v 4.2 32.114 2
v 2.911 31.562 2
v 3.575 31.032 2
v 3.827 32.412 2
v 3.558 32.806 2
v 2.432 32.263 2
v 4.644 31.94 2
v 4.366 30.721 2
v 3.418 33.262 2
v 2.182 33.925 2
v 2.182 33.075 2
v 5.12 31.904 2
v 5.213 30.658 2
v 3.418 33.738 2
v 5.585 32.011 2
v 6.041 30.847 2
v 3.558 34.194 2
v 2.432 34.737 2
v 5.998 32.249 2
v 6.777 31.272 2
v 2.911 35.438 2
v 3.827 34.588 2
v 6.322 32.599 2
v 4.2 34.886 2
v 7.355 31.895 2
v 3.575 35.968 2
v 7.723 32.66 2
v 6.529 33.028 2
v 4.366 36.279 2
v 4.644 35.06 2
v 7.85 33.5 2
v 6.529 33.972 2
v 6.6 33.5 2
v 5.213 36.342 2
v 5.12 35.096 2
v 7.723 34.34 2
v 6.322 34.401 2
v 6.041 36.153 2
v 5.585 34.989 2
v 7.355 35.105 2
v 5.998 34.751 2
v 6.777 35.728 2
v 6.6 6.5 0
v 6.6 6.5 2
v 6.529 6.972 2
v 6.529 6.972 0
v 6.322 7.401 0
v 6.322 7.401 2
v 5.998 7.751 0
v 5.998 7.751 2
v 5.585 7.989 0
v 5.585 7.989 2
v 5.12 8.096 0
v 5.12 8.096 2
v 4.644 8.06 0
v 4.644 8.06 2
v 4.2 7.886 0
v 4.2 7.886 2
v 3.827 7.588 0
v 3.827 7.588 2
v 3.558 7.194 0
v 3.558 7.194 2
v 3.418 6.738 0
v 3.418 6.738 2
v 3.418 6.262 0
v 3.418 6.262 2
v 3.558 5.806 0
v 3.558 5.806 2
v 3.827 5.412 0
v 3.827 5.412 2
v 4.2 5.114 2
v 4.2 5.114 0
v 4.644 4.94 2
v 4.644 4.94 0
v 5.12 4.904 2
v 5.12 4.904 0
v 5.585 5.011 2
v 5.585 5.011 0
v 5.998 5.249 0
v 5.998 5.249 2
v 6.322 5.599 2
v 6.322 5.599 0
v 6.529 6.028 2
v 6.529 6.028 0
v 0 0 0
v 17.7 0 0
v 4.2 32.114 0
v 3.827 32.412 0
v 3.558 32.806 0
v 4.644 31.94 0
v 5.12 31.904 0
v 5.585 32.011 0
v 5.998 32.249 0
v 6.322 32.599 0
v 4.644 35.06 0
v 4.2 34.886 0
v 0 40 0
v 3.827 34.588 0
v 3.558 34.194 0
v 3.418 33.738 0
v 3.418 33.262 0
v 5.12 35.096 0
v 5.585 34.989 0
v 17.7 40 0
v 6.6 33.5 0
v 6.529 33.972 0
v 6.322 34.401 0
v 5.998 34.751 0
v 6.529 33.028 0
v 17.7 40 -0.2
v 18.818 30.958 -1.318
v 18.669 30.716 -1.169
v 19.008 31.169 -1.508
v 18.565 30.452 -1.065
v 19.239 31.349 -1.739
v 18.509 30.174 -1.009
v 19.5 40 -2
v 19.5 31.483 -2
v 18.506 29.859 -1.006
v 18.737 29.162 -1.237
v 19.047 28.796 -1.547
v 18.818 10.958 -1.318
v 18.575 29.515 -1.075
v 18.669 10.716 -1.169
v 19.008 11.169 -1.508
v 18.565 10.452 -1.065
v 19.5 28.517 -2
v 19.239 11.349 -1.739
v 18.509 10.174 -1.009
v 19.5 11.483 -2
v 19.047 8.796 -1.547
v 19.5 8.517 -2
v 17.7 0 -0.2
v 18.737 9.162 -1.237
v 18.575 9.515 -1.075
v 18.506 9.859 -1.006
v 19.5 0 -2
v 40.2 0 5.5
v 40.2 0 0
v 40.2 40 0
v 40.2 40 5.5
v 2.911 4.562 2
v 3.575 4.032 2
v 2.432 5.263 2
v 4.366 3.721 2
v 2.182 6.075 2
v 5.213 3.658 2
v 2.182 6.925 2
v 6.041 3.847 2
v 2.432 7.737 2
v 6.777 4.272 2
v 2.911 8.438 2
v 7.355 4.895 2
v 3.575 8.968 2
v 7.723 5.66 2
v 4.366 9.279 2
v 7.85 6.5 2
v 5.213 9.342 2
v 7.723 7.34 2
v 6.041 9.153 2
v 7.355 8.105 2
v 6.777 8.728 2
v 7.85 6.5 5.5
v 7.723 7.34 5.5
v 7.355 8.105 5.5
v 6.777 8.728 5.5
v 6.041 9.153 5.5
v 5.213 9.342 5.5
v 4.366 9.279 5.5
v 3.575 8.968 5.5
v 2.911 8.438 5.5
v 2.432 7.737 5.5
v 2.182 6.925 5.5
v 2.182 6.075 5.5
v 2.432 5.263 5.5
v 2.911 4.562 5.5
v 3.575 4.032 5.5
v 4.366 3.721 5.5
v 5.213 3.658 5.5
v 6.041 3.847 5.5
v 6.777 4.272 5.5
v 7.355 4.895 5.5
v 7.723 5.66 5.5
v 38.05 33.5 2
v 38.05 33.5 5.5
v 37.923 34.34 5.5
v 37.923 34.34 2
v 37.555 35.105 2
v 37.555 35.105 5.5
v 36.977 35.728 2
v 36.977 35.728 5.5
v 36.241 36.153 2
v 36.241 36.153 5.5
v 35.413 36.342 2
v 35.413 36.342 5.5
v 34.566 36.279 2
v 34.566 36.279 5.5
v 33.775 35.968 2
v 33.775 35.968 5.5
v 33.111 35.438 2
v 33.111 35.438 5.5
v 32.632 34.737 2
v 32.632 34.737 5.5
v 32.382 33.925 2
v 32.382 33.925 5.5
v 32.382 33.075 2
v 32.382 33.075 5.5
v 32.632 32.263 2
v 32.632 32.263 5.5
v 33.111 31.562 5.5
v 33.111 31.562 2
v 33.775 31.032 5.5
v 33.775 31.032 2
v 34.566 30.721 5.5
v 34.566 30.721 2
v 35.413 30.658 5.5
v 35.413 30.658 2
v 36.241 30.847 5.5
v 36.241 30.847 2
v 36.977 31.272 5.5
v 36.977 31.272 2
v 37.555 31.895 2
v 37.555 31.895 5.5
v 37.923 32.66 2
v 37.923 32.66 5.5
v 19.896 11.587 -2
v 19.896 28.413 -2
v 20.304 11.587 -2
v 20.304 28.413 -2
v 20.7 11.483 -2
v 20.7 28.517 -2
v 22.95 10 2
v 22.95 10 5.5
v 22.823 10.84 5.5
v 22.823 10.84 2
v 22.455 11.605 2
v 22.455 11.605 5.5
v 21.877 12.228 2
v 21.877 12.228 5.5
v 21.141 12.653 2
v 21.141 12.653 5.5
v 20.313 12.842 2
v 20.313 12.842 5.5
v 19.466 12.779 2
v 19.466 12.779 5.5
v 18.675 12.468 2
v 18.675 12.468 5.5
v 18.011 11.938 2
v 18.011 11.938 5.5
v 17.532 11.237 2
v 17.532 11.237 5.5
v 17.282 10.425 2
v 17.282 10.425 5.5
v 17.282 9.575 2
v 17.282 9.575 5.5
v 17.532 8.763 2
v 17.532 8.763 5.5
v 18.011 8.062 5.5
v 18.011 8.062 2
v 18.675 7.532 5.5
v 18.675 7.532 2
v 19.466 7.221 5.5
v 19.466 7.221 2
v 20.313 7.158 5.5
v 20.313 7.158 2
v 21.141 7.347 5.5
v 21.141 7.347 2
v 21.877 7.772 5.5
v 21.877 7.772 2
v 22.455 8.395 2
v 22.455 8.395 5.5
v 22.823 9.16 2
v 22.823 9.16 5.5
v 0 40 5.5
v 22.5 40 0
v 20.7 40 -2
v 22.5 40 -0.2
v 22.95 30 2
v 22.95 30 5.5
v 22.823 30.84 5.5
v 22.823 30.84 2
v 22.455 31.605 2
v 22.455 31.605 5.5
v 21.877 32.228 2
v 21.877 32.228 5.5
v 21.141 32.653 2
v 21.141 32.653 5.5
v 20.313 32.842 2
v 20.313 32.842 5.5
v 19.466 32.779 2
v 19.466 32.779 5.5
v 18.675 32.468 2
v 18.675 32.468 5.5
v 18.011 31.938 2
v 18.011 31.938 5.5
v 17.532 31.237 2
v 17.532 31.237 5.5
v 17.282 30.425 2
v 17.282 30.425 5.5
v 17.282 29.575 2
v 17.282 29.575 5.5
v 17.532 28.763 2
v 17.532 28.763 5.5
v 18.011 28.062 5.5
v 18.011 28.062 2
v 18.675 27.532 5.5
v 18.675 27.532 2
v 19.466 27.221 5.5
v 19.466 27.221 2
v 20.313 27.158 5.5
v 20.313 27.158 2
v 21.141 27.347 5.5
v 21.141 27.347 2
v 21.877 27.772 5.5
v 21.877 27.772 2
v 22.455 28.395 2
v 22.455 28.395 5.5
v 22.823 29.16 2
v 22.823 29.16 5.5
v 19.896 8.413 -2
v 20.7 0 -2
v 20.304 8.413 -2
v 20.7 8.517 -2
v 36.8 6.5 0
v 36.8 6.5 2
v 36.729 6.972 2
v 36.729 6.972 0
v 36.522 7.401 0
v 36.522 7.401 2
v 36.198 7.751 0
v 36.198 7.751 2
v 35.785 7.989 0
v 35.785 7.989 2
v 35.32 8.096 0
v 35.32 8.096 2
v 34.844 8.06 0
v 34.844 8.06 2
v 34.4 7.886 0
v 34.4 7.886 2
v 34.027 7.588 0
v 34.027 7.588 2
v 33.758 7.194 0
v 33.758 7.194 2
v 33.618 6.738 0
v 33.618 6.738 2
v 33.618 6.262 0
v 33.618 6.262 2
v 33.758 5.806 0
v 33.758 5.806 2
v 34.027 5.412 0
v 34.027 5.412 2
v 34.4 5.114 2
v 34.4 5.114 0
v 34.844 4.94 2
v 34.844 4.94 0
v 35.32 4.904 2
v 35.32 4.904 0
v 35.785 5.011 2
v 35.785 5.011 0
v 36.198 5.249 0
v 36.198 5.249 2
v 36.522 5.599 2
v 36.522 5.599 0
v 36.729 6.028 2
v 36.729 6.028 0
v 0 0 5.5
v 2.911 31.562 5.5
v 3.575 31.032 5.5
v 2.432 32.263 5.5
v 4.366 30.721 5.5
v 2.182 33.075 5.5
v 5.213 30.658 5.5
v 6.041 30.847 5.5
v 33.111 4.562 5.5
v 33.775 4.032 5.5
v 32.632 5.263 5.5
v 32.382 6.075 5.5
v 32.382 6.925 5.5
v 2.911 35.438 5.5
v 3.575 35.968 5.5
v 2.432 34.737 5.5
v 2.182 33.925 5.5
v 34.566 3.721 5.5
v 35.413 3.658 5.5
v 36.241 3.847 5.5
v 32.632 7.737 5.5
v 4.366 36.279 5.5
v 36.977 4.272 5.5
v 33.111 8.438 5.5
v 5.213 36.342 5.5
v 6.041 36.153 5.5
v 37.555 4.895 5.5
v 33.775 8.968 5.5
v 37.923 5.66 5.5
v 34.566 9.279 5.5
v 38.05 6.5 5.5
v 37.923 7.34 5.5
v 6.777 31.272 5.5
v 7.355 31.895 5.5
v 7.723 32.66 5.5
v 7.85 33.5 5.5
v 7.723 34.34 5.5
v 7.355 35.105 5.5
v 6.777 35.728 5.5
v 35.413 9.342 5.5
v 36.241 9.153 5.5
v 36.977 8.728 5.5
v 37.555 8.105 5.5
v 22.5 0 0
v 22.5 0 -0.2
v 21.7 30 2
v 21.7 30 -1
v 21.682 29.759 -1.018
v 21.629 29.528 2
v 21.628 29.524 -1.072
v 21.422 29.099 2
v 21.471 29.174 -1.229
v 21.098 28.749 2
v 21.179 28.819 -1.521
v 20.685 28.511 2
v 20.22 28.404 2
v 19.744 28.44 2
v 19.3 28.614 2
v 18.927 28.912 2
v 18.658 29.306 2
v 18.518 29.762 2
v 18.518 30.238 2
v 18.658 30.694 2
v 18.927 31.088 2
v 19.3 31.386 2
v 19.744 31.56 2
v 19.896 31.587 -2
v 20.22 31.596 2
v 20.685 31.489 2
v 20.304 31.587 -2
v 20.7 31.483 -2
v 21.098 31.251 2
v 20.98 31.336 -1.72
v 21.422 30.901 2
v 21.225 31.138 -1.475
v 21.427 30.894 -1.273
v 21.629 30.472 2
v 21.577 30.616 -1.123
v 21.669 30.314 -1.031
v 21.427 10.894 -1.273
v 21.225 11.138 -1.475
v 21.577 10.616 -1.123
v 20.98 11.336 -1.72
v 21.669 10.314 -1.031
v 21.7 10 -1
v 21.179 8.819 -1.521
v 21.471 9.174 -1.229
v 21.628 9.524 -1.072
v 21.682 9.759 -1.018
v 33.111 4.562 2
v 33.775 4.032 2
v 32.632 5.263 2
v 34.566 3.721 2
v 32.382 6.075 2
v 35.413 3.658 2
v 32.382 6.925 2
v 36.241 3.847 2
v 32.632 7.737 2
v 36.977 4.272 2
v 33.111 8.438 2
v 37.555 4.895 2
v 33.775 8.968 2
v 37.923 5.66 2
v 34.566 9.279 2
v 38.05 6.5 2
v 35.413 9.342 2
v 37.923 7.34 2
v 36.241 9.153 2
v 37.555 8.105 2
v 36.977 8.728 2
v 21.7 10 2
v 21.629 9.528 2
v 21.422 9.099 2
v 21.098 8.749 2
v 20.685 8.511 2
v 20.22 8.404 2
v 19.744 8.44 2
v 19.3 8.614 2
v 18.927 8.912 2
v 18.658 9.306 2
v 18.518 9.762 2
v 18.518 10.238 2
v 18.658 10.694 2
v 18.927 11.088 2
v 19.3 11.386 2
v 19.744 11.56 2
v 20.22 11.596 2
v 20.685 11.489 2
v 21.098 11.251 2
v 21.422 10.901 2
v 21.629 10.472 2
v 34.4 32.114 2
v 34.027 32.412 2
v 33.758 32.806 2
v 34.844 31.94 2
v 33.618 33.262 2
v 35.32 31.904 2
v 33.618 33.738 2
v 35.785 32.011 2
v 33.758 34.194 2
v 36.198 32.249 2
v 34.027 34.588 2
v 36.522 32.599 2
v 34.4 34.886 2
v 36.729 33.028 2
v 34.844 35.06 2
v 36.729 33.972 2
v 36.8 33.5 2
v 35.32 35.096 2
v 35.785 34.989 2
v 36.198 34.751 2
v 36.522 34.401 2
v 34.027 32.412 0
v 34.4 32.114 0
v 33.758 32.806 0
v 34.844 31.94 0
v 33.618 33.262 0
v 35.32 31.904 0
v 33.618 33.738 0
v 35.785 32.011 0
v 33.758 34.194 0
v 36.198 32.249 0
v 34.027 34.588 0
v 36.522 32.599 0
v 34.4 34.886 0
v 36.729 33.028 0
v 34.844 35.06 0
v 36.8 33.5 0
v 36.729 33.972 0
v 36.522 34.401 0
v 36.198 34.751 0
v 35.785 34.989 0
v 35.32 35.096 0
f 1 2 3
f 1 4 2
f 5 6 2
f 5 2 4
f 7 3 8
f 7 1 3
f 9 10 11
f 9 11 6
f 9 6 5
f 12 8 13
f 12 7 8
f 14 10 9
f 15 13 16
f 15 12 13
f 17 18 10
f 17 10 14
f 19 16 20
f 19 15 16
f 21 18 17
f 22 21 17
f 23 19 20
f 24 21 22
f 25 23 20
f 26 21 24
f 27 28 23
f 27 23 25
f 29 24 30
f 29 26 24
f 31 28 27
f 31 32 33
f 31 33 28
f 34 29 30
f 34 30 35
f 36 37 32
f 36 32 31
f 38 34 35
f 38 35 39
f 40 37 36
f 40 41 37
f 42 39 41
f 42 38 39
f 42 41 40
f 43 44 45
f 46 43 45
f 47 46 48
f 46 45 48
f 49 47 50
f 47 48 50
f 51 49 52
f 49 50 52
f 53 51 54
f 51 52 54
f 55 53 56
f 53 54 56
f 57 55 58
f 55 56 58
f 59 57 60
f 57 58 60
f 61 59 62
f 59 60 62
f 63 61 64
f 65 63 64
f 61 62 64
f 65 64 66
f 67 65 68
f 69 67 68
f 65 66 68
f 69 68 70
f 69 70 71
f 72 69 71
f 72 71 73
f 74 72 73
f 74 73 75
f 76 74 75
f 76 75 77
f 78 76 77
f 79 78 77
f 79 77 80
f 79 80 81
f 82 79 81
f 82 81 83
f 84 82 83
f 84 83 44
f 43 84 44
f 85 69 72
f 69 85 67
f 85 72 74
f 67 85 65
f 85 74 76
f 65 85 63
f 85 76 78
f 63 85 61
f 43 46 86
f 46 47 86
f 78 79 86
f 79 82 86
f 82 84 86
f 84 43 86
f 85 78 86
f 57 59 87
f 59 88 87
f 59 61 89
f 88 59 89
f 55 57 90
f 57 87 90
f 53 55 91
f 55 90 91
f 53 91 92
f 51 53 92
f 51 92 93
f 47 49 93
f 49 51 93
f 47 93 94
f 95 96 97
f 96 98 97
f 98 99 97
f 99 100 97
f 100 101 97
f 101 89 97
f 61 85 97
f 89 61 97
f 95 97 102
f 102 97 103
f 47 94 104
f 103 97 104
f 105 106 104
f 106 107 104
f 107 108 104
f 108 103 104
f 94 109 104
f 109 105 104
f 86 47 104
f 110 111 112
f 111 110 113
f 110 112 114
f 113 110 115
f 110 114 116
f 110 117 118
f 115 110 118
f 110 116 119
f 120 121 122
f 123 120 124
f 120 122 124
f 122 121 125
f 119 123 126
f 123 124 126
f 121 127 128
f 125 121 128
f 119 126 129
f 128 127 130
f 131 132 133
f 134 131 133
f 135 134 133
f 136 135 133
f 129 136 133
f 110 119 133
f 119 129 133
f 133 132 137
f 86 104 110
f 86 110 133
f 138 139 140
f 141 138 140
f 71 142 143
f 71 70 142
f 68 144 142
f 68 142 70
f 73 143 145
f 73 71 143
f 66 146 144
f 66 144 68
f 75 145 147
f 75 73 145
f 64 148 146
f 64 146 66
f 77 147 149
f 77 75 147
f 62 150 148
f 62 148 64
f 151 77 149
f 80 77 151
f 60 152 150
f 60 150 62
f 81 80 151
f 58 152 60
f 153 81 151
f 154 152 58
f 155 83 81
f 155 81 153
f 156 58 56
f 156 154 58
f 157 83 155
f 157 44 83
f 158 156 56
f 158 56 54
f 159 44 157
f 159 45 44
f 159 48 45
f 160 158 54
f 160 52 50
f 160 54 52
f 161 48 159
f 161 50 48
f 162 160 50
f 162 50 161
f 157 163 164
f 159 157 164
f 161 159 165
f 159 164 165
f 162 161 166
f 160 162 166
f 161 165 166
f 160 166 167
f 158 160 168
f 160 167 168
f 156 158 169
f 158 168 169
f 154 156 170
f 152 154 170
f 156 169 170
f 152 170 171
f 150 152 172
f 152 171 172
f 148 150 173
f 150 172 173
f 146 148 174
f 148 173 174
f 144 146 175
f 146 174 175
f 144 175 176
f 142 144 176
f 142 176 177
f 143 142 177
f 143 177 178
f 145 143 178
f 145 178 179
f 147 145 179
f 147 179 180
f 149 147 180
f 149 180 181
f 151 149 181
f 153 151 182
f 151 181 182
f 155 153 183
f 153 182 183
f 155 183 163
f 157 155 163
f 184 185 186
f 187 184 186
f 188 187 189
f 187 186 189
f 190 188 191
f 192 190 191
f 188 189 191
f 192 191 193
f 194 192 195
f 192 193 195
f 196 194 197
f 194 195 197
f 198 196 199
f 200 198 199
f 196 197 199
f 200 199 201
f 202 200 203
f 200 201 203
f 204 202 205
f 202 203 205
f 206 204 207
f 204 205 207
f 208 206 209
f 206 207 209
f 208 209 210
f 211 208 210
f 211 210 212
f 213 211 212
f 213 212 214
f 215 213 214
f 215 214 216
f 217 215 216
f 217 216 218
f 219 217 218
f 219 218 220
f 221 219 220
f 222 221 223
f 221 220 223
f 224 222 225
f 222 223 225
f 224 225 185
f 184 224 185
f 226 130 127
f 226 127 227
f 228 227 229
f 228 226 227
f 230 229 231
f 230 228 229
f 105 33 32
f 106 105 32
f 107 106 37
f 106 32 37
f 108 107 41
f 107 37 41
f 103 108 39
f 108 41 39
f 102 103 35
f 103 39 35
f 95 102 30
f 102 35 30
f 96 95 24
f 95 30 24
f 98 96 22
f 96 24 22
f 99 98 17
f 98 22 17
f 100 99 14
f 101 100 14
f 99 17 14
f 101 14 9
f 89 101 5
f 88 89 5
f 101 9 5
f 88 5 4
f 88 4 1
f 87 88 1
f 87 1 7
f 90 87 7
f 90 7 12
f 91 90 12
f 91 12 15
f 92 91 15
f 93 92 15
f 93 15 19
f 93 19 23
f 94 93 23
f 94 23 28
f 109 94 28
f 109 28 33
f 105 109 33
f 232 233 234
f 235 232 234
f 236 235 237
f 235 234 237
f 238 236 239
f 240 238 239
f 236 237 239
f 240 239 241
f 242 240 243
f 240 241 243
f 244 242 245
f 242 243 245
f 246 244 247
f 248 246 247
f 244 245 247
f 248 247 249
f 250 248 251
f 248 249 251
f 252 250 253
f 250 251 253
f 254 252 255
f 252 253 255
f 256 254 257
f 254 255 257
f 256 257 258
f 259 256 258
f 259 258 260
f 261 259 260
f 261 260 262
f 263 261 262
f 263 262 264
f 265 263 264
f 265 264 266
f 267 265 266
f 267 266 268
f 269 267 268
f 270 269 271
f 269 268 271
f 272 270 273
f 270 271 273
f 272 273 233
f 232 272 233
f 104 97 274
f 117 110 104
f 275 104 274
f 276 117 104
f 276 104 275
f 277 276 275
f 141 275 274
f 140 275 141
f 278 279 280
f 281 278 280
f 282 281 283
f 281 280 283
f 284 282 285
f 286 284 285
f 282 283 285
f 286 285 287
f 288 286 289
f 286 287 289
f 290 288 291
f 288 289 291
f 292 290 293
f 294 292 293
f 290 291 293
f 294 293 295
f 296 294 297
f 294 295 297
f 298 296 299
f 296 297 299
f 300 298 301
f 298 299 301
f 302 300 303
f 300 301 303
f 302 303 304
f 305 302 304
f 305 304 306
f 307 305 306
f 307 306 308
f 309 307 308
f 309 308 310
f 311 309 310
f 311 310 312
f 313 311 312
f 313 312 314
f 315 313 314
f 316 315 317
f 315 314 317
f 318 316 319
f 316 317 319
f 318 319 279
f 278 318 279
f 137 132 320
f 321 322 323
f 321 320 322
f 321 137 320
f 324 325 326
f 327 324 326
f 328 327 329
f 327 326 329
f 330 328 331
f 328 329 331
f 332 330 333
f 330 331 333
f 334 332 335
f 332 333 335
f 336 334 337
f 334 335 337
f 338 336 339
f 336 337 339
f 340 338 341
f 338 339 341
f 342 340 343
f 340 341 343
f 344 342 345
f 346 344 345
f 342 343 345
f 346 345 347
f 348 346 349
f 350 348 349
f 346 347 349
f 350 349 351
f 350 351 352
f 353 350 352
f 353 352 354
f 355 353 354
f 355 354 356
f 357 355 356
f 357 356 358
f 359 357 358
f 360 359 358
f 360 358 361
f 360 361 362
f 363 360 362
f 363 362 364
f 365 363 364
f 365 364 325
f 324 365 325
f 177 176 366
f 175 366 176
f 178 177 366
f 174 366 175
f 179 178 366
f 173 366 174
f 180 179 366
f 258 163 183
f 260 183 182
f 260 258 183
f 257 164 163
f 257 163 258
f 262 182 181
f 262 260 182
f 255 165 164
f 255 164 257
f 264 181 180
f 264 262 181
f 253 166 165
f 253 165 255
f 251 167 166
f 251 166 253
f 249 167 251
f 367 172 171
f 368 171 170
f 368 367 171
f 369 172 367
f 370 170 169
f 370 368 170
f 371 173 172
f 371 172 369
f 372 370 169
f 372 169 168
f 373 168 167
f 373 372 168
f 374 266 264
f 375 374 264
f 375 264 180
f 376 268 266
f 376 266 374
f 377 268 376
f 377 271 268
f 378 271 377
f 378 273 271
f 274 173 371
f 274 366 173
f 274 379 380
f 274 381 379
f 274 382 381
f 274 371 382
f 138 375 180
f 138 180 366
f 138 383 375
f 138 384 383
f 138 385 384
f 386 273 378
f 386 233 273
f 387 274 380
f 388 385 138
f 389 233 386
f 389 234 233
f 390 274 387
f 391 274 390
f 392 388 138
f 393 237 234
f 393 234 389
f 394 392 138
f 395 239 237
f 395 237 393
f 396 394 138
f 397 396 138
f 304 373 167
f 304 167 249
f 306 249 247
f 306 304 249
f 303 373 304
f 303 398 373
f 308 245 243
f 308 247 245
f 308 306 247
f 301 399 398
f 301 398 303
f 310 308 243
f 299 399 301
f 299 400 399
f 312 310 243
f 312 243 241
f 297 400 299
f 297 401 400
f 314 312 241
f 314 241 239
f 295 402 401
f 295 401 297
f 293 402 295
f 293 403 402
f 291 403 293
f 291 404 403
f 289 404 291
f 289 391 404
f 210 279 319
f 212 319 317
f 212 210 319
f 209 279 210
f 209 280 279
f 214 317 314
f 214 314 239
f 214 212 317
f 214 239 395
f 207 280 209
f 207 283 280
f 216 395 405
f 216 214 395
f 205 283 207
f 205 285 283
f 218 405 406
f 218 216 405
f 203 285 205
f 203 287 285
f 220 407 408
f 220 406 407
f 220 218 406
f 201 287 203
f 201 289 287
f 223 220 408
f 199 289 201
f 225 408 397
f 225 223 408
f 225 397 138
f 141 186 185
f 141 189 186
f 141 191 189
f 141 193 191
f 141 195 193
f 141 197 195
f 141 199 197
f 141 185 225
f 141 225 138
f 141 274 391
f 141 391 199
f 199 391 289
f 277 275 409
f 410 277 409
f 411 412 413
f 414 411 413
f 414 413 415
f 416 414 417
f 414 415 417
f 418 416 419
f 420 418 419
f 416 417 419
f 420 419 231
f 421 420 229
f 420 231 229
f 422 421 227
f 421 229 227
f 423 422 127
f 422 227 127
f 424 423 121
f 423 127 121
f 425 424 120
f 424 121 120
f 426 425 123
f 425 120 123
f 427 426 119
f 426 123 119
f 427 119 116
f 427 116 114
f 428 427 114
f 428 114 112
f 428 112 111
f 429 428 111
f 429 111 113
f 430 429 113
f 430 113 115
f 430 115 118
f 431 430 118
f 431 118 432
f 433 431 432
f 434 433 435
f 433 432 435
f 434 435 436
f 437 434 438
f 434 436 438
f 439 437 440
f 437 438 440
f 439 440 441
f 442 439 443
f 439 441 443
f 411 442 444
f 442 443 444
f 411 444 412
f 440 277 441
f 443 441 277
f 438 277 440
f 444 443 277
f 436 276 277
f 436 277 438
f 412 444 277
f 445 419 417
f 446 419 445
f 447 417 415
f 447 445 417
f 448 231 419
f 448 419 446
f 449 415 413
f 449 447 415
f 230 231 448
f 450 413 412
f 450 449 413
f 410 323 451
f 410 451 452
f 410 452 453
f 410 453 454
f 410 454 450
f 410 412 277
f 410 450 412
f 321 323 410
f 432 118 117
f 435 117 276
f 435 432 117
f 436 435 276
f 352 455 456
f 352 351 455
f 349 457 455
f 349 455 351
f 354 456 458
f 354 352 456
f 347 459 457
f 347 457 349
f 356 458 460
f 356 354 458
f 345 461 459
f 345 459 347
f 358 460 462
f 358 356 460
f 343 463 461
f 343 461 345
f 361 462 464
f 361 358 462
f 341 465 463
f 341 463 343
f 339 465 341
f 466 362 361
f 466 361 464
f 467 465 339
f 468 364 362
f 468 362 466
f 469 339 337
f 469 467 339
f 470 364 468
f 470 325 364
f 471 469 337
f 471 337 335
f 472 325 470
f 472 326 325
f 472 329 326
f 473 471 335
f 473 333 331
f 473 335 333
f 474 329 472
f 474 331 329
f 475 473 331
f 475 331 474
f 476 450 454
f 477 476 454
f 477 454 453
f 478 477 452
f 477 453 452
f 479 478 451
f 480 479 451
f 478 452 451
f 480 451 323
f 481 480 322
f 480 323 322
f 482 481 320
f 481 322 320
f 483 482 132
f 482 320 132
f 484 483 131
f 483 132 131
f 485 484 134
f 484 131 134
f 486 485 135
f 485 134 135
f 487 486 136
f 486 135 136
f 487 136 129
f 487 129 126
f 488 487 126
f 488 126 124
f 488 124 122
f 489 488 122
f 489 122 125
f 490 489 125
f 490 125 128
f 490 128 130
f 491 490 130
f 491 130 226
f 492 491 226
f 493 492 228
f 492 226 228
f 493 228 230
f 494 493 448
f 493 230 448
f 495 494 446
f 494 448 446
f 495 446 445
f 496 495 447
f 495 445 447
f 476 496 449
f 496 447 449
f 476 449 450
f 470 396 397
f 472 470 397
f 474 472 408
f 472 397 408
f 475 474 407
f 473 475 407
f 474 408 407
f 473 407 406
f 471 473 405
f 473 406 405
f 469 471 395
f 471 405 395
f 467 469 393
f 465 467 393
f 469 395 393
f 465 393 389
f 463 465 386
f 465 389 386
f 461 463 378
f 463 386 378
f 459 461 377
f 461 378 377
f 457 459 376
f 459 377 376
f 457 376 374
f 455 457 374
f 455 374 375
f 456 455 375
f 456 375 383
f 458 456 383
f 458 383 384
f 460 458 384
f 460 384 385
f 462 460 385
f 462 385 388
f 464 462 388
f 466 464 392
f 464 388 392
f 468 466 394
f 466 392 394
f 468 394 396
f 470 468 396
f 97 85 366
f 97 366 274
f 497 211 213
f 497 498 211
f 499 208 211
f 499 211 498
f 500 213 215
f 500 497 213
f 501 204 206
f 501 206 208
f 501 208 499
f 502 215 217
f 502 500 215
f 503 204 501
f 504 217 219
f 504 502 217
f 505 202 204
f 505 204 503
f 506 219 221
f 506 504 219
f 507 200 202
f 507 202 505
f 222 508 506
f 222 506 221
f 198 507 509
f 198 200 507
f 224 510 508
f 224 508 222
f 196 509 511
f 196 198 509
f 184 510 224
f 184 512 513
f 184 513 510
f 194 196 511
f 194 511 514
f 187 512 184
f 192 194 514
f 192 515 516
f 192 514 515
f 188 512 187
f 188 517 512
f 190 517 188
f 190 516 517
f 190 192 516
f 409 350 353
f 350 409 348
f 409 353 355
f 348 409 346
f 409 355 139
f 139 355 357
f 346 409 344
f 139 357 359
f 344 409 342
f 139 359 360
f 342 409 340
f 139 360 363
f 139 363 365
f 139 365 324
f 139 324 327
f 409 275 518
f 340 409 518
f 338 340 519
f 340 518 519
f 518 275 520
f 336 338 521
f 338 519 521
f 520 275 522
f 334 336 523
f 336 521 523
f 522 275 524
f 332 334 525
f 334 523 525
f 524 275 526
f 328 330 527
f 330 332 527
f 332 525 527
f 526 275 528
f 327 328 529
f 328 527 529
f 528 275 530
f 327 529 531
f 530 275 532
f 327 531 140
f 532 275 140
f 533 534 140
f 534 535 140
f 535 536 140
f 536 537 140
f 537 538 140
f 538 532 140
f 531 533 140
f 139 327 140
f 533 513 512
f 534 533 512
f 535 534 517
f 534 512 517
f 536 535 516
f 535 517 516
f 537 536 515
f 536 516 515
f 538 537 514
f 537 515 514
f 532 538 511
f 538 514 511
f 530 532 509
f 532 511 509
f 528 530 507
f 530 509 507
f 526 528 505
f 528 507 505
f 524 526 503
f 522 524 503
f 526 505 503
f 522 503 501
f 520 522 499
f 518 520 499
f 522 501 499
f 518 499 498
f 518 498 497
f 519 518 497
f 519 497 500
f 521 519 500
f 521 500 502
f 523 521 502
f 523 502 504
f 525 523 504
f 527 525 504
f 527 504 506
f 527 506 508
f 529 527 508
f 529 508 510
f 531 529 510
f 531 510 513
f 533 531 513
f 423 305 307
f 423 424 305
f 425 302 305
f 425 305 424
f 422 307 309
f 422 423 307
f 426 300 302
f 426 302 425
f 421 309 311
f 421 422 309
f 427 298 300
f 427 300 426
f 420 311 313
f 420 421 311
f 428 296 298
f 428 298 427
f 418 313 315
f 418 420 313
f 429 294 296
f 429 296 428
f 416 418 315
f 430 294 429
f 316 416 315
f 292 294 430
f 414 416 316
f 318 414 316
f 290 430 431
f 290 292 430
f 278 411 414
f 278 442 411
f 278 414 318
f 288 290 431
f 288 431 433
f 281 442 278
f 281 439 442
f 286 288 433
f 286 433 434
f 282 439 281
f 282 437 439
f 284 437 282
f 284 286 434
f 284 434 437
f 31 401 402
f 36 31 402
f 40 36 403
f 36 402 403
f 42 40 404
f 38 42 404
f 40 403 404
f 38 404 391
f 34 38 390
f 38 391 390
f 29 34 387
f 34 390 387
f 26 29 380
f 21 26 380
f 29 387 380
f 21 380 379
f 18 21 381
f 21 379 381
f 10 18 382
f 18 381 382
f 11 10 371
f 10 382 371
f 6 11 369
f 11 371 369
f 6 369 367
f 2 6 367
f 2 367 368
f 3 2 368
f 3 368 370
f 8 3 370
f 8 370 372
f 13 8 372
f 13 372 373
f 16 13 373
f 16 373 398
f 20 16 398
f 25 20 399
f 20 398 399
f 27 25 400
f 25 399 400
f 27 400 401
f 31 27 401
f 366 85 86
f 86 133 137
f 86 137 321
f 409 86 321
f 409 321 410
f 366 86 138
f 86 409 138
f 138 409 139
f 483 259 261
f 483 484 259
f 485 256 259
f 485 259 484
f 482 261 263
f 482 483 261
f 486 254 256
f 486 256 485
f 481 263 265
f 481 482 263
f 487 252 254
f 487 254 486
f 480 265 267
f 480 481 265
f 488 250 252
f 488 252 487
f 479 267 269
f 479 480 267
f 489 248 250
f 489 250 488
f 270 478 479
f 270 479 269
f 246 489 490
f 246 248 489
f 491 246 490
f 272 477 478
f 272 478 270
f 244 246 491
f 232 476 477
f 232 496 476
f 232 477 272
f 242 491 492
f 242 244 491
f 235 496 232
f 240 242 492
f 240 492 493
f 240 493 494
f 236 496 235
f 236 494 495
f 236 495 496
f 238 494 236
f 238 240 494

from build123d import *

# Parameters (mm, degrees)
F0_W      = 40.2
F0_H      = 40
F1_DEPTH  = 5.5
F2_R      = 2.85
F3_DEPTH  = 3.5
F4_R      = 1.6
F5_DEPTH  = 25
F6_W      = 4.8
F6_H      = 40
F7_DEPTH  = 2
F8_SIZE   = 1.8
F9_R      = 1.6
F10_DEPTH = 25
F11_R     = 2.85
F12_DEPTH = 3.5


with BuildPart() as f1:
    # F0 (on Top) → F1 (new body)
    with BuildSketch(Plane.XY):
        with Locations((20.1, 20)):
            Rectangle(F0_W, F0_H)
    extrude(amount=F1_DEPTH)

    # F2 (on face) → F3 (cut)
    with BuildSketch(Plane.XY.offset(5.5)):
        with Locations((35.2, 6.5)):
            Circle(F2_R)
        with Locations((35.2, 33.5)):
            Circle(F2_R)
        with Locations((5, 33.5)):
            Circle(F2_R)
        with Locations((5, 6.5)):
            Circle(F2_R)
    extrude(amount=-F3_DEPTH, mode=Mode.SUBTRACT)

    # F4 (on face) → F5 (cut)
    with BuildSketch(Plane.XY.offset(5.5)):
        with Locations((35.2, 33.5)):
            Circle(F4_R)
        with Locations((35.2, 6.5)):
            Circle(F4_R)
        with Locations((5, 33.5)):
            Circle(F4_R)
        with Locations((5, 6.5)):
            Circle(F4_R)
    extrude(amount=-F5_DEPTH, mode=Mode.SUBTRACT)

    # F6 (on face) → F7 (join)
    with BuildSketch(Plane(origin=(0, 0, 0), x_dir=(1, 0, 0), z_dir=(0, 0, -1))):
        with Locations((20.1, -20)):
            Rectangle(F6_W, F6_H)
    extrude(amount=F7_DEPTH)

    # F8
    f8_edges = [f1.edges().sort_by_distance(p)[0] for p in [
        (17.7, 20, -2),
        (22.5, 20, -2),
    ]]
    chamfer(f8_edges, length=F8_SIZE)

    # F9 (on face) → F10 (cut)
    with BuildSketch(Plane(origin=(0, 0, -2), x_dir=(1, 0, 0), z_dir=(0, 0, -1))):
        with Locations((20.1, -30)):
            Circle(F9_R)
        with Locations((20.1, -10)):
            Circle(F9_R)
    extrude(amount=-F10_DEPTH, mode=Mode.SUBTRACT)

    # F11 (on face) → F12 (cut)
    with BuildSketch(Plane.XY.offset(5.5)):
        with Locations((20.1, 30)):
            Circle(F11_R)
        with Locations((20.1, 10)):
            Circle(F11_R)
    extrude(amount=-F12_DEPTH, mode=Mode.SUBTRACT)


solid = f1.part
